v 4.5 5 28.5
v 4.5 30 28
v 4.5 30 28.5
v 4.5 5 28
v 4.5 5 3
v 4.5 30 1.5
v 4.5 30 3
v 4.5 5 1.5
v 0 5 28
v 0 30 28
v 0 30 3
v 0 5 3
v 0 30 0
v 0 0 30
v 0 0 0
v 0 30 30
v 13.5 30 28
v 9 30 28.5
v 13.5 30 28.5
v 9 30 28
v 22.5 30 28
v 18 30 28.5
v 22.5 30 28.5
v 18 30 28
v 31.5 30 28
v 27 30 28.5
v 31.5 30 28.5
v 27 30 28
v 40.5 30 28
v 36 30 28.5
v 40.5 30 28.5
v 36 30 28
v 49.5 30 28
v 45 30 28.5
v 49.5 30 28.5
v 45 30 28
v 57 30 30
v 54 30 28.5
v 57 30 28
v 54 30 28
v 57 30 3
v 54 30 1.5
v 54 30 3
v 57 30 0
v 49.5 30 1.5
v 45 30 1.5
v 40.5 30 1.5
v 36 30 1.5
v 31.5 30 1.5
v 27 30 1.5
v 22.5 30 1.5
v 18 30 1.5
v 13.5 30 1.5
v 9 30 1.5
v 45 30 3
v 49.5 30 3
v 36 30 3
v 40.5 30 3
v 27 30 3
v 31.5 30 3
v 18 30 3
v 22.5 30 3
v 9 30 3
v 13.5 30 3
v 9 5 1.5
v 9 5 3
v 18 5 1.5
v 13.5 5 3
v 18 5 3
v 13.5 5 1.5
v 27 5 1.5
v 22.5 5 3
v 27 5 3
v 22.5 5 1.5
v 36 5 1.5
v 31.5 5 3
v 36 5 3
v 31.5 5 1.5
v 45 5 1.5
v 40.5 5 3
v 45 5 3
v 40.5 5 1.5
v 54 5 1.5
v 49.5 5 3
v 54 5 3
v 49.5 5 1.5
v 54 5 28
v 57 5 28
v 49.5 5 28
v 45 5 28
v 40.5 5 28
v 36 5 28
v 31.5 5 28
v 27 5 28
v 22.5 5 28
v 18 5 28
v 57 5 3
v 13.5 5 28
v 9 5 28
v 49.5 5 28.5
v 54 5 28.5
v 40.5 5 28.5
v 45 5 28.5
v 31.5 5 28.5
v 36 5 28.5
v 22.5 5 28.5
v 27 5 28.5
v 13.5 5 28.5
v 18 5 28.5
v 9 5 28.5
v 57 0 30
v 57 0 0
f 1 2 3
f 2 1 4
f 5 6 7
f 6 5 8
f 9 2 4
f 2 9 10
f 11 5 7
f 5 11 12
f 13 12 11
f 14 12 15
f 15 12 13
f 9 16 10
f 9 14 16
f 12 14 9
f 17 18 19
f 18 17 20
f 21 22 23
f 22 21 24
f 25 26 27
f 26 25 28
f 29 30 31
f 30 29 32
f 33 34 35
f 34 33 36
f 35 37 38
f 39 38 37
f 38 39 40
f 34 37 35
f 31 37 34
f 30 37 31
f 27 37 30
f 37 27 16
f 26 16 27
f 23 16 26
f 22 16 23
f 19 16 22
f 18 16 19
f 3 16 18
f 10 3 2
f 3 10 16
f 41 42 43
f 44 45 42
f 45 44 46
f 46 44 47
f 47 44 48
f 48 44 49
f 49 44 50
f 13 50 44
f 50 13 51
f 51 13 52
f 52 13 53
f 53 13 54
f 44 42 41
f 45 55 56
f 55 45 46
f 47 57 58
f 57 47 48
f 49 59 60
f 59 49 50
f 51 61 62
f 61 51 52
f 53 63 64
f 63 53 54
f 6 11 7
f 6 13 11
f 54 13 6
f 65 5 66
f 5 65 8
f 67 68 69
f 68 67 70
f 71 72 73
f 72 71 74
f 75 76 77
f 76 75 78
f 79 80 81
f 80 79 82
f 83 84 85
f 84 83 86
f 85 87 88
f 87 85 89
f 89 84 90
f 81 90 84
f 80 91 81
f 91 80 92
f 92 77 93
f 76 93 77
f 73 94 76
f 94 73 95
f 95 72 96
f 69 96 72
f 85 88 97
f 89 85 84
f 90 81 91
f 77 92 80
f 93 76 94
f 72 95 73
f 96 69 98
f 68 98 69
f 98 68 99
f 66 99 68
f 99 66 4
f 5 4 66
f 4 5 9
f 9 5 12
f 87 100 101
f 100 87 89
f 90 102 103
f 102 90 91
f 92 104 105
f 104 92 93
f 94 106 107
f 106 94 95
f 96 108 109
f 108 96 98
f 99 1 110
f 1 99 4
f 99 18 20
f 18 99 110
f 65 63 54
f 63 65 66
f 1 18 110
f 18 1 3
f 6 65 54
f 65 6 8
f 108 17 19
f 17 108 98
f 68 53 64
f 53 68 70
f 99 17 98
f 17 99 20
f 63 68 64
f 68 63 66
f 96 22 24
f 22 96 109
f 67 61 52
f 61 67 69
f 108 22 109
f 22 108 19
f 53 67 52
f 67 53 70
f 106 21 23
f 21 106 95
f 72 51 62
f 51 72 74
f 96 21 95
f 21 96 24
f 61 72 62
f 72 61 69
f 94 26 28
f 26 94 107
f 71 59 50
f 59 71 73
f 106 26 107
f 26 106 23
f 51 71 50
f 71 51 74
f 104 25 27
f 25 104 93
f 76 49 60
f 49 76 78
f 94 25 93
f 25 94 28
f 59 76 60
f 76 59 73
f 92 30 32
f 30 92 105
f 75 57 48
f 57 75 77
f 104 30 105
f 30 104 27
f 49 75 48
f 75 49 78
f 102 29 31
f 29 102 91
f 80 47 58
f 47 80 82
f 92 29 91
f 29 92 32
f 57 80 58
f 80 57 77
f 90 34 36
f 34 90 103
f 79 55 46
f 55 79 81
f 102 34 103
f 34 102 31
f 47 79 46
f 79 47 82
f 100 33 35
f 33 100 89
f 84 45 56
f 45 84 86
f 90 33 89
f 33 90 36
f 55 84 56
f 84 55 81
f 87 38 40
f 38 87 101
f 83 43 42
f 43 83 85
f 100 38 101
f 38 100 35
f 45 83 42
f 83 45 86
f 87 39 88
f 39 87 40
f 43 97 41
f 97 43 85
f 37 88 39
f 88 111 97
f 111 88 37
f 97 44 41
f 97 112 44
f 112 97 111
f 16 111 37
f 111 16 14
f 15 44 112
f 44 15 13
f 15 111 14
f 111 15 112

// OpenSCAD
difference() {
    cube([57, 30, 30]);
    for(i = [0:8]) {
        translate([9 * i , 5, 3]) {
            cube([4.5, 25, 25]);
        }
        translate([9 * i + 4.5 , 5, 1.5]) {
            cube([4.5, 25, 27]);
        }
    }


}
